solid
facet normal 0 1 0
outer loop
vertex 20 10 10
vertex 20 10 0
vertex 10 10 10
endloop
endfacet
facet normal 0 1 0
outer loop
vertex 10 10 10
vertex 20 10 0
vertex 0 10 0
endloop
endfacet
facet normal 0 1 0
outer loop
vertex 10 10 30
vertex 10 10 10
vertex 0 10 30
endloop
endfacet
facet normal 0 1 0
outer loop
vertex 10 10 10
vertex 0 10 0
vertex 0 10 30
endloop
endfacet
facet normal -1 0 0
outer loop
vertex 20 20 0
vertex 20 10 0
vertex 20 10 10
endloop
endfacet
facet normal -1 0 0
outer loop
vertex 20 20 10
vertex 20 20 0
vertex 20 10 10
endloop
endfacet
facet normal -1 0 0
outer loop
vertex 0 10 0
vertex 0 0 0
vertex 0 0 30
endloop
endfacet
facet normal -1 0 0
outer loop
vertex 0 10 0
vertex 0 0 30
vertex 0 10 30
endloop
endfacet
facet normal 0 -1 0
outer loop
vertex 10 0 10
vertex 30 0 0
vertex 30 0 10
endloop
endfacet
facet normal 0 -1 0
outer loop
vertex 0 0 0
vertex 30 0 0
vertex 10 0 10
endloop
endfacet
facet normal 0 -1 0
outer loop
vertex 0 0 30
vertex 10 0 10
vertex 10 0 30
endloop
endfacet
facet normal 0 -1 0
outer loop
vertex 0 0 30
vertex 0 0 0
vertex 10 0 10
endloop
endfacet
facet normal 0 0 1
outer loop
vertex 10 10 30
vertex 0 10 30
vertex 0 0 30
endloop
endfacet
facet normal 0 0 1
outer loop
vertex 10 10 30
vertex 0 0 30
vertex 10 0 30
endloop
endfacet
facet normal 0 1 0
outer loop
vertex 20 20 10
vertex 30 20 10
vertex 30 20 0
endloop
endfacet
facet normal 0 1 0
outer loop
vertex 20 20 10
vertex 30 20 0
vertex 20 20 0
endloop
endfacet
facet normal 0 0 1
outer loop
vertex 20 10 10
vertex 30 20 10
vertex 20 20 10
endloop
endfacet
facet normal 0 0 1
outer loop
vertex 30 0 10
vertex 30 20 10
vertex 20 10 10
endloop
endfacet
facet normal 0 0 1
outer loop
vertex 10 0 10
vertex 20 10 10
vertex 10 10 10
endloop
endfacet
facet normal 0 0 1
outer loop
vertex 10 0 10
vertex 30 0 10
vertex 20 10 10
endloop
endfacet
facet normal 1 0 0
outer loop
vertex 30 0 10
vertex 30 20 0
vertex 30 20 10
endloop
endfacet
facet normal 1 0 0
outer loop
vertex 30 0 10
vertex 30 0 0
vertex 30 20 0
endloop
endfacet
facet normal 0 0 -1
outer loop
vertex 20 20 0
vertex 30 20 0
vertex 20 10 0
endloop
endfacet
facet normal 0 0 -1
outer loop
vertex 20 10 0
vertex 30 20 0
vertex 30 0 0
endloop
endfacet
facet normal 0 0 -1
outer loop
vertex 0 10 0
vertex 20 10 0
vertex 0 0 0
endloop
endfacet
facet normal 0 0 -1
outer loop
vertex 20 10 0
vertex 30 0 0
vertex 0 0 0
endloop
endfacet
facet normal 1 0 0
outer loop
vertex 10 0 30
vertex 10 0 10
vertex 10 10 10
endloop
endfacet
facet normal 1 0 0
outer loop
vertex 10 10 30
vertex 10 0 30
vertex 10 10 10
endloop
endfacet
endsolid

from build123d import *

# Parameters (mm, degrees)
F0_W     = 10
F0_H     = 10
F1_DEPTH = 30
F2_W     = 10
F2_H     = 10
F3_DEPTH = 20
F4_W     = 10
F4_H     = 10
F5_DEPTH = 10


with BuildPart() as f1:
    # F0 (on Top) → F1 (new body)
    with BuildSketch(Plane.XY):
        with Locations((5, 5)):
            Rectangle(F0_W, F0_H)
    extrude(amount=F1_DEPTH)

    # F2 (on face) → F3 (join)
    with BuildSketch(Plane.YZ.offset(10)):
        with Locations((5, 5)):
            Rectangle(F2_W, F2_H)
    extrude(amount=F3_DEPTH)

    # F4 (on face) → F5 (join)
    with BuildSketch(Plane(origin=(0, 10, 0), x_dir=(-1, 0, 0), z_dir=(0, 1, 0))):
        with Locations((-25, 5)):
            Rectangle(F4_W, F4_H)
    extrude(amount=F5_DEPTH)


solid = f1.part
